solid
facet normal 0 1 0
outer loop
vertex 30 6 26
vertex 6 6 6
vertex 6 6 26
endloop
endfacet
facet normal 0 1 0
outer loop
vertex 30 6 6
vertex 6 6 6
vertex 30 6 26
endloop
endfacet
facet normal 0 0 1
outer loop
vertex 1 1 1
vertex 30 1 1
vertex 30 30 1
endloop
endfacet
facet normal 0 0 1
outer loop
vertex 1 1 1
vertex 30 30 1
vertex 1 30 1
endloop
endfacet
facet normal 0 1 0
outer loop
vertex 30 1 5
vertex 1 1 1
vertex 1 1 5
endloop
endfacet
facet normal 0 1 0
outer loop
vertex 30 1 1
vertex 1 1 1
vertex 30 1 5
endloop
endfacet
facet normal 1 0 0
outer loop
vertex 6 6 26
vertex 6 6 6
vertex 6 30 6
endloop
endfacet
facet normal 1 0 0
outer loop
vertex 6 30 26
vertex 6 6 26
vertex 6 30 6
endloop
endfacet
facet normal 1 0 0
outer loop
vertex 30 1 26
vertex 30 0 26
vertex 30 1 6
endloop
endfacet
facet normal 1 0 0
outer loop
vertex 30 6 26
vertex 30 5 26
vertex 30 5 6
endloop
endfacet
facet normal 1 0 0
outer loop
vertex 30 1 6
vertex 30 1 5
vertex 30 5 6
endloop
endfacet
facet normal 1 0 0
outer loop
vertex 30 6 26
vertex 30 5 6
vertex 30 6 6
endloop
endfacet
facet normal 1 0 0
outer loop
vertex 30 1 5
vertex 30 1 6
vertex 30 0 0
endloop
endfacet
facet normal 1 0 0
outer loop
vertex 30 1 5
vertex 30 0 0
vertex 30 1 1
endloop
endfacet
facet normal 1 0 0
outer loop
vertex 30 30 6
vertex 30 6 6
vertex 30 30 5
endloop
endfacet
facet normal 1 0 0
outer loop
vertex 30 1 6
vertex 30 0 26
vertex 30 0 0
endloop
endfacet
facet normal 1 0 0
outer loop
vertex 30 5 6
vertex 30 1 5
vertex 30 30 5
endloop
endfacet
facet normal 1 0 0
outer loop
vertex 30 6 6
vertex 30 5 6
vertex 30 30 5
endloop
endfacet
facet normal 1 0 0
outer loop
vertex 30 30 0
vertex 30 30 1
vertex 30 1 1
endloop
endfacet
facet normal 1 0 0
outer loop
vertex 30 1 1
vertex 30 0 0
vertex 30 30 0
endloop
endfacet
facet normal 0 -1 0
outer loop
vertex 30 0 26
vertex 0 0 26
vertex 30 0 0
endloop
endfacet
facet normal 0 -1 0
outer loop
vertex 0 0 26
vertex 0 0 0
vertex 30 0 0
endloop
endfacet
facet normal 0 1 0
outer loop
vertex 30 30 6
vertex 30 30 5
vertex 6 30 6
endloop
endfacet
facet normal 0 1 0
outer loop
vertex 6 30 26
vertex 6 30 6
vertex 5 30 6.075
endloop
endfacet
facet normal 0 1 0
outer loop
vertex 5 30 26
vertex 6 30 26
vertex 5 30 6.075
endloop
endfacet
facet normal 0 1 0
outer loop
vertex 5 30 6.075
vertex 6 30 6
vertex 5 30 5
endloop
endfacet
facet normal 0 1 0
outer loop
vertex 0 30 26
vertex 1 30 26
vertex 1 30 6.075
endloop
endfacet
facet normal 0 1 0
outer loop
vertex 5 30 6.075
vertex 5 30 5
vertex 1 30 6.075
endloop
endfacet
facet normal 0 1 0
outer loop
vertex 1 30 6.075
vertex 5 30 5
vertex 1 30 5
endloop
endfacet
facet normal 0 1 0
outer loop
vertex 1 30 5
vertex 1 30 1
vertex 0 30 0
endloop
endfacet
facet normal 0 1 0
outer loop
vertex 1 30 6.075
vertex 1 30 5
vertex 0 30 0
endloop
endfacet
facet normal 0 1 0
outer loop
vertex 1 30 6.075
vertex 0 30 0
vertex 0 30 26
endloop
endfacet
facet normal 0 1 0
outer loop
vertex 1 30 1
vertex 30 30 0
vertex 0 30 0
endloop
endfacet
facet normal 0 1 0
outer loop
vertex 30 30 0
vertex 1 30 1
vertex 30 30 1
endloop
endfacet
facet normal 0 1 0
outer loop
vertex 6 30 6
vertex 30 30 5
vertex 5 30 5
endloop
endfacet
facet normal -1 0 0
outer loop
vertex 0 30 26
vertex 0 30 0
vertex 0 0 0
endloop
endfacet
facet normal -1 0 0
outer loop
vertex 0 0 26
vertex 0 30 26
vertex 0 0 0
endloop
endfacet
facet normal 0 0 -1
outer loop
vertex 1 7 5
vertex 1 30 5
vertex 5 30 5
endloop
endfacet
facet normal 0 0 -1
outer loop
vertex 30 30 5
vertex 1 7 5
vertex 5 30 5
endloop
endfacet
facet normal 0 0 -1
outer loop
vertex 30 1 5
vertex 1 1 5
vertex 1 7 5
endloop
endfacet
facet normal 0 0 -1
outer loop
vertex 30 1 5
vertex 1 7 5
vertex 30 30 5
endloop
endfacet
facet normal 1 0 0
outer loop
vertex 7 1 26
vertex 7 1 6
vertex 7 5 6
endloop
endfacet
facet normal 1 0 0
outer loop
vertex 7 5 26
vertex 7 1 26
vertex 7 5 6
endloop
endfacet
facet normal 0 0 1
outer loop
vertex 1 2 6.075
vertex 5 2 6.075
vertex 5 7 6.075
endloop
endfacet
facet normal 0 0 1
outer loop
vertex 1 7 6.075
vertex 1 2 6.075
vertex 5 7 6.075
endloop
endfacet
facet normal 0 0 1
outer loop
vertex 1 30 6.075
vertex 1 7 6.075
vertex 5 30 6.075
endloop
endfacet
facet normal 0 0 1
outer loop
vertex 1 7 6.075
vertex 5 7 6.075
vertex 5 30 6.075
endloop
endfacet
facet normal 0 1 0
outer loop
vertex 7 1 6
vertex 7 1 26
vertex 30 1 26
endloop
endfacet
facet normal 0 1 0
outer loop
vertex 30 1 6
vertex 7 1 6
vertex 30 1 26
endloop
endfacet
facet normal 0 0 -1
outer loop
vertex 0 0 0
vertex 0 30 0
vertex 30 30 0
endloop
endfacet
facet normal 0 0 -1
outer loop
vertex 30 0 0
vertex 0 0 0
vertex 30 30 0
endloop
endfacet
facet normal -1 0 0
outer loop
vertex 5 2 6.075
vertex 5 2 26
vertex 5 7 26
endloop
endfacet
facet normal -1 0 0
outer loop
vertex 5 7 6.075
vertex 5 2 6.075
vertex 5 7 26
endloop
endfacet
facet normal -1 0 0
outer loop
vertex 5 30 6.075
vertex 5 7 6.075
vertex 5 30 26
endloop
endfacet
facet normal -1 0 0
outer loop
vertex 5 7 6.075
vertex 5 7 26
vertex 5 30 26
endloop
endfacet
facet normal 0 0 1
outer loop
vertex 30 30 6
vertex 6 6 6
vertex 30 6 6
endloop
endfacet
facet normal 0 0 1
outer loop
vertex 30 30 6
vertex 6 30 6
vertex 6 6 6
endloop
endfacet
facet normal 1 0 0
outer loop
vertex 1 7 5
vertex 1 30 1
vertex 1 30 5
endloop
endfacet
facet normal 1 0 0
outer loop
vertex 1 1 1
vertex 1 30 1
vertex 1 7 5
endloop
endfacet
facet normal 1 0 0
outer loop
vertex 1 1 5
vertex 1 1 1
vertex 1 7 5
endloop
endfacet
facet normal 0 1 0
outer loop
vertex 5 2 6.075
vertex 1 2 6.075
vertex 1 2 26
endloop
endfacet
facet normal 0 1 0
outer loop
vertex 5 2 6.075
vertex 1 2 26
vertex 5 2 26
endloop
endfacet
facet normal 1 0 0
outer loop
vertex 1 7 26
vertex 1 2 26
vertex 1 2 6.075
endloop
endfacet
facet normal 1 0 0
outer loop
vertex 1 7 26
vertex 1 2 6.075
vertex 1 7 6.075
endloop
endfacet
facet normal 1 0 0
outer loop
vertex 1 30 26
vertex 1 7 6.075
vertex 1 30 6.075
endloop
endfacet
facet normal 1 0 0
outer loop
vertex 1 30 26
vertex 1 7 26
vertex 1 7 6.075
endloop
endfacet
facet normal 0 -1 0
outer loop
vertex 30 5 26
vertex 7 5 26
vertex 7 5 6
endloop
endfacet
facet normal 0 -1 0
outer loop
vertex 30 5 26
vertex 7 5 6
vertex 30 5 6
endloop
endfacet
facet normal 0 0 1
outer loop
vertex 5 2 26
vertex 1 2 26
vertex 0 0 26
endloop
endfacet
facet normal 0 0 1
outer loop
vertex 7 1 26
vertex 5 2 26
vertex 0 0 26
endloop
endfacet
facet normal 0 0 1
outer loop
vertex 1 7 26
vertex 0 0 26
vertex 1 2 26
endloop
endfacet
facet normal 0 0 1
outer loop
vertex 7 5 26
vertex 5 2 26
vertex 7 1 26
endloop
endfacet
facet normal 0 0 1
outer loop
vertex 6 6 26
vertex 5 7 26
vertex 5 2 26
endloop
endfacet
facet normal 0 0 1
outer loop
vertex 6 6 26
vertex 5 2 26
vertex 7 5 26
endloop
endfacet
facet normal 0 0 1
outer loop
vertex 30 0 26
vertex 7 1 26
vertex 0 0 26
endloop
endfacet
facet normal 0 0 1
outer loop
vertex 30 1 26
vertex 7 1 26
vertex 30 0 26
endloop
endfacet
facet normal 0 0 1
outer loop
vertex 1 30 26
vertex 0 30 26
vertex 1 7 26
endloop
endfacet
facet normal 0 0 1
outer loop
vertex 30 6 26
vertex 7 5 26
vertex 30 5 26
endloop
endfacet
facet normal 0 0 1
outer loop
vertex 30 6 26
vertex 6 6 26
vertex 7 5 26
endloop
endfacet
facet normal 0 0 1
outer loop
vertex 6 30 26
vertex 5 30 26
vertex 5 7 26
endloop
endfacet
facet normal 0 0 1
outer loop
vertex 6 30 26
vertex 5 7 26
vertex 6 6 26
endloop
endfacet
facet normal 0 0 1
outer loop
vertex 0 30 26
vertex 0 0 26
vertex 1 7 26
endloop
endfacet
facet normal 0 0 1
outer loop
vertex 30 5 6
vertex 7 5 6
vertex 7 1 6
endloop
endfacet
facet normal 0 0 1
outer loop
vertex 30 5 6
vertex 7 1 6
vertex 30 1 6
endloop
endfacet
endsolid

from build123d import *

# Parameters (mm, degrees)
SKETCH1_W            = 30
SKETCH1_H            = 30
BOSS_EXTRUDE1_DEPTH  = 6
BOSS_EXTRUDE4_DEPTH  = 20
SKETCH4_W            = 2
SKETCH4_H            = 2
BOSS_EXTRUDE6_DEPTH  = 20
SKETCH5_W            = 24
SKETCH5_H            = 6
BOSS_EXTRUDE7_DEPTH  = 20
SHELL2_START         = 7
SHELL2_DEPTH         = 23
SHELL2_START_2       = 1
SHELL2_2_DEPTH       = 4
SHELL2_START_3       = 5
SHELL2_3_OUTLINE_W   = 29
SHELL2_3_OUTLINE_H   = 4
SHELL2_3_DEPTH       = 2
SKETCH7_W            = 23
SKETCH7_H            = 1
BOSS_EXTRUDE8_DEPTH  = 5
SKETCH9_W            = 1.075143629
SKETCH9_H            = 23
BOSS_EXTRUDE9_DEPTH  = 5
SKETCH10_W           = 4
SKETCH10_H           = 23
CUT_EXTRUDE1_DEPTH   = 10
SKETCH11_W           = 23
SKETCH11_H           = 4
CUT_EXTRUDE2_DEPTH   = 10
BOSS_EXTRUDE11_DEPTH = 20
SKETCH14_W           = 4
SKETCH14_H           = 19.924856371
CUT_EXTRUDE4_DEPTH   = 5


# Read off the part's stored shape, not the designer's step: Shell2
with BuildPart() as part:
    # Sketch1 → Boss-Extrude1 (new body)
    with BuildSketch(Plane.XY):
        with Locations((15, 15)):
            Rectangle(SKETCH1_W, SKETCH1_H)
    extrude(amount=BOSS_EXTRUDE1_DEPTH)

    # Sketch2 → Boss-Extrude4 (add)
    with BuildSketch(Plane.XY.offset(6)):
        Polygon((5, 6), (6, 6), (6, 30), (0, 30), (0, 6), align=None)
    extrude(amount=BOSS_EXTRUDE4_DEPTH)

    # Sketch4 → Boss-Extrude6 (add)
    with BuildSketch(Plane.XY.offset(6)):
        with Locations((5, 5)):
            Rectangle(SKETCH4_W, SKETCH4_H)
    extrude(amount=BOSS_EXTRUDE6_DEPTH)

    # Sketch5 → Boss-Extrude7 (add)
    with BuildSketch(Plane.XY.offset(6)):
        with Locations((18, 3)):
            Rectangle(SKETCH5_W, SKETCH5_H)
    extrude(amount=BOSS_EXTRUDE7_DEPTH)

    # Shell2 outline → Shell2 (cut)
    with BuildSketch(Plane(origin=(0, 0, 0), x_dir=(1, 0, 0), z_dir=(0, 1, 0)).offset(SHELL2_START)):
        Polygon((5, -5), (30, -5), (30, -1), (1, -1), (1, -25), (5, -25), align=None)
    extrude(amount=SHELL2_DEPTH, mode=Mode.SUBTRACT)

    # Shell2 2 outline → Shell2 2 (cut)
    with BuildSketch(Plane(origin=(0, 0, 0), x_dir=(1, 0, 0), z_dir=(0, 1, 0)).offset(SHELL2_START_2)):
        Polygon((7, -5), (7, -25), (30, -25), (30, -1), (1, -1), (1, -5), align=None)
    extrude(amount=SHELL2_2_DEPTH, mode=Mode.SUBTRACT)

    # Shell2 3 outline → Shell2 3 (cut)
    with BuildSketch(Plane(origin=(0, 0, 0), x_dir=(1, 0, 0), z_dir=(0, 1, 0)).offset(SHELL2_START_3)):
        with Locations((15.5, -3)):
            Rectangle(SHELL2_3_OUTLINE_W, SHELL2_3_OUTLINE_H)
    extrude(amount=SHELL2_3_DEPTH, mode=Mode.SUBTRACT)

    # Sketch7 → Boss-Extrude8 (add)
    with BuildSketch(Plane.XZ.offset(-5)):
        with Locations((18.5, 5.5)):
            Rectangle(SKETCH7_W, SKETCH7_H)
    extrude(amount=BOSS_EXTRUDE8_DEPTH)

    # Sketch9 → Boss-Extrude9 (add)
    with BuildSketch(Plane.ZY.offset(-5)):
        with Locations((5.537571814, 18.5)):
            Rectangle(SKETCH9_W, SKETCH9_H)
    extrude(amount=BOSS_EXTRUDE9_DEPTH)

    # Sketch10 → Cut-Extrude1 (cut)
    with BuildSketch(Plane.XY.offset(26)):
        with Locations((3, 18.5)):
            Rectangle(SKETCH10_W, SKETCH10_H)
    extrude(amount=-CUT_EXTRUDE1_DEPTH, mode=Mode.SUBTRACT)

    # Sketch11 → Cut-Extrude2 (cut)
    with BuildSketch(Plane.XY.offset(26)):
        with Locations((18.5, 3)):
            Rectangle(SKETCH11_W, SKETCH11_H)
    extrude(amount=-CUT_EXTRUDE2_DEPTH, mode=Mode.SUBTRACT)

    # Sketch12 → Boss-Extrude11 (add)
    with BuildSketch(Plane.XY.offset(6)):
        Polygon((6, 0), (6, 4), (4, 4), (4, 6), (0, 6), (0, 0), align=None)
    extrude(amount=BOSS_EXTRUDE11_DEPTH)

    # Sketch14 → Cut-Extrude4 (cut)
    with BuildSketch(Plane(origin=(0, 7, 0), x_dir=(1, 0, 0), z_dir=(0, 1, 0))):
        with Locations((3, -16.037571815)):
            Rectangle(SKETCH14_W, SKETCH14_H)
    extrude(amount=-CUT_EXTRUDE4_DEPTH, mode=Mode.SUBTRACT)


solid = part.part
